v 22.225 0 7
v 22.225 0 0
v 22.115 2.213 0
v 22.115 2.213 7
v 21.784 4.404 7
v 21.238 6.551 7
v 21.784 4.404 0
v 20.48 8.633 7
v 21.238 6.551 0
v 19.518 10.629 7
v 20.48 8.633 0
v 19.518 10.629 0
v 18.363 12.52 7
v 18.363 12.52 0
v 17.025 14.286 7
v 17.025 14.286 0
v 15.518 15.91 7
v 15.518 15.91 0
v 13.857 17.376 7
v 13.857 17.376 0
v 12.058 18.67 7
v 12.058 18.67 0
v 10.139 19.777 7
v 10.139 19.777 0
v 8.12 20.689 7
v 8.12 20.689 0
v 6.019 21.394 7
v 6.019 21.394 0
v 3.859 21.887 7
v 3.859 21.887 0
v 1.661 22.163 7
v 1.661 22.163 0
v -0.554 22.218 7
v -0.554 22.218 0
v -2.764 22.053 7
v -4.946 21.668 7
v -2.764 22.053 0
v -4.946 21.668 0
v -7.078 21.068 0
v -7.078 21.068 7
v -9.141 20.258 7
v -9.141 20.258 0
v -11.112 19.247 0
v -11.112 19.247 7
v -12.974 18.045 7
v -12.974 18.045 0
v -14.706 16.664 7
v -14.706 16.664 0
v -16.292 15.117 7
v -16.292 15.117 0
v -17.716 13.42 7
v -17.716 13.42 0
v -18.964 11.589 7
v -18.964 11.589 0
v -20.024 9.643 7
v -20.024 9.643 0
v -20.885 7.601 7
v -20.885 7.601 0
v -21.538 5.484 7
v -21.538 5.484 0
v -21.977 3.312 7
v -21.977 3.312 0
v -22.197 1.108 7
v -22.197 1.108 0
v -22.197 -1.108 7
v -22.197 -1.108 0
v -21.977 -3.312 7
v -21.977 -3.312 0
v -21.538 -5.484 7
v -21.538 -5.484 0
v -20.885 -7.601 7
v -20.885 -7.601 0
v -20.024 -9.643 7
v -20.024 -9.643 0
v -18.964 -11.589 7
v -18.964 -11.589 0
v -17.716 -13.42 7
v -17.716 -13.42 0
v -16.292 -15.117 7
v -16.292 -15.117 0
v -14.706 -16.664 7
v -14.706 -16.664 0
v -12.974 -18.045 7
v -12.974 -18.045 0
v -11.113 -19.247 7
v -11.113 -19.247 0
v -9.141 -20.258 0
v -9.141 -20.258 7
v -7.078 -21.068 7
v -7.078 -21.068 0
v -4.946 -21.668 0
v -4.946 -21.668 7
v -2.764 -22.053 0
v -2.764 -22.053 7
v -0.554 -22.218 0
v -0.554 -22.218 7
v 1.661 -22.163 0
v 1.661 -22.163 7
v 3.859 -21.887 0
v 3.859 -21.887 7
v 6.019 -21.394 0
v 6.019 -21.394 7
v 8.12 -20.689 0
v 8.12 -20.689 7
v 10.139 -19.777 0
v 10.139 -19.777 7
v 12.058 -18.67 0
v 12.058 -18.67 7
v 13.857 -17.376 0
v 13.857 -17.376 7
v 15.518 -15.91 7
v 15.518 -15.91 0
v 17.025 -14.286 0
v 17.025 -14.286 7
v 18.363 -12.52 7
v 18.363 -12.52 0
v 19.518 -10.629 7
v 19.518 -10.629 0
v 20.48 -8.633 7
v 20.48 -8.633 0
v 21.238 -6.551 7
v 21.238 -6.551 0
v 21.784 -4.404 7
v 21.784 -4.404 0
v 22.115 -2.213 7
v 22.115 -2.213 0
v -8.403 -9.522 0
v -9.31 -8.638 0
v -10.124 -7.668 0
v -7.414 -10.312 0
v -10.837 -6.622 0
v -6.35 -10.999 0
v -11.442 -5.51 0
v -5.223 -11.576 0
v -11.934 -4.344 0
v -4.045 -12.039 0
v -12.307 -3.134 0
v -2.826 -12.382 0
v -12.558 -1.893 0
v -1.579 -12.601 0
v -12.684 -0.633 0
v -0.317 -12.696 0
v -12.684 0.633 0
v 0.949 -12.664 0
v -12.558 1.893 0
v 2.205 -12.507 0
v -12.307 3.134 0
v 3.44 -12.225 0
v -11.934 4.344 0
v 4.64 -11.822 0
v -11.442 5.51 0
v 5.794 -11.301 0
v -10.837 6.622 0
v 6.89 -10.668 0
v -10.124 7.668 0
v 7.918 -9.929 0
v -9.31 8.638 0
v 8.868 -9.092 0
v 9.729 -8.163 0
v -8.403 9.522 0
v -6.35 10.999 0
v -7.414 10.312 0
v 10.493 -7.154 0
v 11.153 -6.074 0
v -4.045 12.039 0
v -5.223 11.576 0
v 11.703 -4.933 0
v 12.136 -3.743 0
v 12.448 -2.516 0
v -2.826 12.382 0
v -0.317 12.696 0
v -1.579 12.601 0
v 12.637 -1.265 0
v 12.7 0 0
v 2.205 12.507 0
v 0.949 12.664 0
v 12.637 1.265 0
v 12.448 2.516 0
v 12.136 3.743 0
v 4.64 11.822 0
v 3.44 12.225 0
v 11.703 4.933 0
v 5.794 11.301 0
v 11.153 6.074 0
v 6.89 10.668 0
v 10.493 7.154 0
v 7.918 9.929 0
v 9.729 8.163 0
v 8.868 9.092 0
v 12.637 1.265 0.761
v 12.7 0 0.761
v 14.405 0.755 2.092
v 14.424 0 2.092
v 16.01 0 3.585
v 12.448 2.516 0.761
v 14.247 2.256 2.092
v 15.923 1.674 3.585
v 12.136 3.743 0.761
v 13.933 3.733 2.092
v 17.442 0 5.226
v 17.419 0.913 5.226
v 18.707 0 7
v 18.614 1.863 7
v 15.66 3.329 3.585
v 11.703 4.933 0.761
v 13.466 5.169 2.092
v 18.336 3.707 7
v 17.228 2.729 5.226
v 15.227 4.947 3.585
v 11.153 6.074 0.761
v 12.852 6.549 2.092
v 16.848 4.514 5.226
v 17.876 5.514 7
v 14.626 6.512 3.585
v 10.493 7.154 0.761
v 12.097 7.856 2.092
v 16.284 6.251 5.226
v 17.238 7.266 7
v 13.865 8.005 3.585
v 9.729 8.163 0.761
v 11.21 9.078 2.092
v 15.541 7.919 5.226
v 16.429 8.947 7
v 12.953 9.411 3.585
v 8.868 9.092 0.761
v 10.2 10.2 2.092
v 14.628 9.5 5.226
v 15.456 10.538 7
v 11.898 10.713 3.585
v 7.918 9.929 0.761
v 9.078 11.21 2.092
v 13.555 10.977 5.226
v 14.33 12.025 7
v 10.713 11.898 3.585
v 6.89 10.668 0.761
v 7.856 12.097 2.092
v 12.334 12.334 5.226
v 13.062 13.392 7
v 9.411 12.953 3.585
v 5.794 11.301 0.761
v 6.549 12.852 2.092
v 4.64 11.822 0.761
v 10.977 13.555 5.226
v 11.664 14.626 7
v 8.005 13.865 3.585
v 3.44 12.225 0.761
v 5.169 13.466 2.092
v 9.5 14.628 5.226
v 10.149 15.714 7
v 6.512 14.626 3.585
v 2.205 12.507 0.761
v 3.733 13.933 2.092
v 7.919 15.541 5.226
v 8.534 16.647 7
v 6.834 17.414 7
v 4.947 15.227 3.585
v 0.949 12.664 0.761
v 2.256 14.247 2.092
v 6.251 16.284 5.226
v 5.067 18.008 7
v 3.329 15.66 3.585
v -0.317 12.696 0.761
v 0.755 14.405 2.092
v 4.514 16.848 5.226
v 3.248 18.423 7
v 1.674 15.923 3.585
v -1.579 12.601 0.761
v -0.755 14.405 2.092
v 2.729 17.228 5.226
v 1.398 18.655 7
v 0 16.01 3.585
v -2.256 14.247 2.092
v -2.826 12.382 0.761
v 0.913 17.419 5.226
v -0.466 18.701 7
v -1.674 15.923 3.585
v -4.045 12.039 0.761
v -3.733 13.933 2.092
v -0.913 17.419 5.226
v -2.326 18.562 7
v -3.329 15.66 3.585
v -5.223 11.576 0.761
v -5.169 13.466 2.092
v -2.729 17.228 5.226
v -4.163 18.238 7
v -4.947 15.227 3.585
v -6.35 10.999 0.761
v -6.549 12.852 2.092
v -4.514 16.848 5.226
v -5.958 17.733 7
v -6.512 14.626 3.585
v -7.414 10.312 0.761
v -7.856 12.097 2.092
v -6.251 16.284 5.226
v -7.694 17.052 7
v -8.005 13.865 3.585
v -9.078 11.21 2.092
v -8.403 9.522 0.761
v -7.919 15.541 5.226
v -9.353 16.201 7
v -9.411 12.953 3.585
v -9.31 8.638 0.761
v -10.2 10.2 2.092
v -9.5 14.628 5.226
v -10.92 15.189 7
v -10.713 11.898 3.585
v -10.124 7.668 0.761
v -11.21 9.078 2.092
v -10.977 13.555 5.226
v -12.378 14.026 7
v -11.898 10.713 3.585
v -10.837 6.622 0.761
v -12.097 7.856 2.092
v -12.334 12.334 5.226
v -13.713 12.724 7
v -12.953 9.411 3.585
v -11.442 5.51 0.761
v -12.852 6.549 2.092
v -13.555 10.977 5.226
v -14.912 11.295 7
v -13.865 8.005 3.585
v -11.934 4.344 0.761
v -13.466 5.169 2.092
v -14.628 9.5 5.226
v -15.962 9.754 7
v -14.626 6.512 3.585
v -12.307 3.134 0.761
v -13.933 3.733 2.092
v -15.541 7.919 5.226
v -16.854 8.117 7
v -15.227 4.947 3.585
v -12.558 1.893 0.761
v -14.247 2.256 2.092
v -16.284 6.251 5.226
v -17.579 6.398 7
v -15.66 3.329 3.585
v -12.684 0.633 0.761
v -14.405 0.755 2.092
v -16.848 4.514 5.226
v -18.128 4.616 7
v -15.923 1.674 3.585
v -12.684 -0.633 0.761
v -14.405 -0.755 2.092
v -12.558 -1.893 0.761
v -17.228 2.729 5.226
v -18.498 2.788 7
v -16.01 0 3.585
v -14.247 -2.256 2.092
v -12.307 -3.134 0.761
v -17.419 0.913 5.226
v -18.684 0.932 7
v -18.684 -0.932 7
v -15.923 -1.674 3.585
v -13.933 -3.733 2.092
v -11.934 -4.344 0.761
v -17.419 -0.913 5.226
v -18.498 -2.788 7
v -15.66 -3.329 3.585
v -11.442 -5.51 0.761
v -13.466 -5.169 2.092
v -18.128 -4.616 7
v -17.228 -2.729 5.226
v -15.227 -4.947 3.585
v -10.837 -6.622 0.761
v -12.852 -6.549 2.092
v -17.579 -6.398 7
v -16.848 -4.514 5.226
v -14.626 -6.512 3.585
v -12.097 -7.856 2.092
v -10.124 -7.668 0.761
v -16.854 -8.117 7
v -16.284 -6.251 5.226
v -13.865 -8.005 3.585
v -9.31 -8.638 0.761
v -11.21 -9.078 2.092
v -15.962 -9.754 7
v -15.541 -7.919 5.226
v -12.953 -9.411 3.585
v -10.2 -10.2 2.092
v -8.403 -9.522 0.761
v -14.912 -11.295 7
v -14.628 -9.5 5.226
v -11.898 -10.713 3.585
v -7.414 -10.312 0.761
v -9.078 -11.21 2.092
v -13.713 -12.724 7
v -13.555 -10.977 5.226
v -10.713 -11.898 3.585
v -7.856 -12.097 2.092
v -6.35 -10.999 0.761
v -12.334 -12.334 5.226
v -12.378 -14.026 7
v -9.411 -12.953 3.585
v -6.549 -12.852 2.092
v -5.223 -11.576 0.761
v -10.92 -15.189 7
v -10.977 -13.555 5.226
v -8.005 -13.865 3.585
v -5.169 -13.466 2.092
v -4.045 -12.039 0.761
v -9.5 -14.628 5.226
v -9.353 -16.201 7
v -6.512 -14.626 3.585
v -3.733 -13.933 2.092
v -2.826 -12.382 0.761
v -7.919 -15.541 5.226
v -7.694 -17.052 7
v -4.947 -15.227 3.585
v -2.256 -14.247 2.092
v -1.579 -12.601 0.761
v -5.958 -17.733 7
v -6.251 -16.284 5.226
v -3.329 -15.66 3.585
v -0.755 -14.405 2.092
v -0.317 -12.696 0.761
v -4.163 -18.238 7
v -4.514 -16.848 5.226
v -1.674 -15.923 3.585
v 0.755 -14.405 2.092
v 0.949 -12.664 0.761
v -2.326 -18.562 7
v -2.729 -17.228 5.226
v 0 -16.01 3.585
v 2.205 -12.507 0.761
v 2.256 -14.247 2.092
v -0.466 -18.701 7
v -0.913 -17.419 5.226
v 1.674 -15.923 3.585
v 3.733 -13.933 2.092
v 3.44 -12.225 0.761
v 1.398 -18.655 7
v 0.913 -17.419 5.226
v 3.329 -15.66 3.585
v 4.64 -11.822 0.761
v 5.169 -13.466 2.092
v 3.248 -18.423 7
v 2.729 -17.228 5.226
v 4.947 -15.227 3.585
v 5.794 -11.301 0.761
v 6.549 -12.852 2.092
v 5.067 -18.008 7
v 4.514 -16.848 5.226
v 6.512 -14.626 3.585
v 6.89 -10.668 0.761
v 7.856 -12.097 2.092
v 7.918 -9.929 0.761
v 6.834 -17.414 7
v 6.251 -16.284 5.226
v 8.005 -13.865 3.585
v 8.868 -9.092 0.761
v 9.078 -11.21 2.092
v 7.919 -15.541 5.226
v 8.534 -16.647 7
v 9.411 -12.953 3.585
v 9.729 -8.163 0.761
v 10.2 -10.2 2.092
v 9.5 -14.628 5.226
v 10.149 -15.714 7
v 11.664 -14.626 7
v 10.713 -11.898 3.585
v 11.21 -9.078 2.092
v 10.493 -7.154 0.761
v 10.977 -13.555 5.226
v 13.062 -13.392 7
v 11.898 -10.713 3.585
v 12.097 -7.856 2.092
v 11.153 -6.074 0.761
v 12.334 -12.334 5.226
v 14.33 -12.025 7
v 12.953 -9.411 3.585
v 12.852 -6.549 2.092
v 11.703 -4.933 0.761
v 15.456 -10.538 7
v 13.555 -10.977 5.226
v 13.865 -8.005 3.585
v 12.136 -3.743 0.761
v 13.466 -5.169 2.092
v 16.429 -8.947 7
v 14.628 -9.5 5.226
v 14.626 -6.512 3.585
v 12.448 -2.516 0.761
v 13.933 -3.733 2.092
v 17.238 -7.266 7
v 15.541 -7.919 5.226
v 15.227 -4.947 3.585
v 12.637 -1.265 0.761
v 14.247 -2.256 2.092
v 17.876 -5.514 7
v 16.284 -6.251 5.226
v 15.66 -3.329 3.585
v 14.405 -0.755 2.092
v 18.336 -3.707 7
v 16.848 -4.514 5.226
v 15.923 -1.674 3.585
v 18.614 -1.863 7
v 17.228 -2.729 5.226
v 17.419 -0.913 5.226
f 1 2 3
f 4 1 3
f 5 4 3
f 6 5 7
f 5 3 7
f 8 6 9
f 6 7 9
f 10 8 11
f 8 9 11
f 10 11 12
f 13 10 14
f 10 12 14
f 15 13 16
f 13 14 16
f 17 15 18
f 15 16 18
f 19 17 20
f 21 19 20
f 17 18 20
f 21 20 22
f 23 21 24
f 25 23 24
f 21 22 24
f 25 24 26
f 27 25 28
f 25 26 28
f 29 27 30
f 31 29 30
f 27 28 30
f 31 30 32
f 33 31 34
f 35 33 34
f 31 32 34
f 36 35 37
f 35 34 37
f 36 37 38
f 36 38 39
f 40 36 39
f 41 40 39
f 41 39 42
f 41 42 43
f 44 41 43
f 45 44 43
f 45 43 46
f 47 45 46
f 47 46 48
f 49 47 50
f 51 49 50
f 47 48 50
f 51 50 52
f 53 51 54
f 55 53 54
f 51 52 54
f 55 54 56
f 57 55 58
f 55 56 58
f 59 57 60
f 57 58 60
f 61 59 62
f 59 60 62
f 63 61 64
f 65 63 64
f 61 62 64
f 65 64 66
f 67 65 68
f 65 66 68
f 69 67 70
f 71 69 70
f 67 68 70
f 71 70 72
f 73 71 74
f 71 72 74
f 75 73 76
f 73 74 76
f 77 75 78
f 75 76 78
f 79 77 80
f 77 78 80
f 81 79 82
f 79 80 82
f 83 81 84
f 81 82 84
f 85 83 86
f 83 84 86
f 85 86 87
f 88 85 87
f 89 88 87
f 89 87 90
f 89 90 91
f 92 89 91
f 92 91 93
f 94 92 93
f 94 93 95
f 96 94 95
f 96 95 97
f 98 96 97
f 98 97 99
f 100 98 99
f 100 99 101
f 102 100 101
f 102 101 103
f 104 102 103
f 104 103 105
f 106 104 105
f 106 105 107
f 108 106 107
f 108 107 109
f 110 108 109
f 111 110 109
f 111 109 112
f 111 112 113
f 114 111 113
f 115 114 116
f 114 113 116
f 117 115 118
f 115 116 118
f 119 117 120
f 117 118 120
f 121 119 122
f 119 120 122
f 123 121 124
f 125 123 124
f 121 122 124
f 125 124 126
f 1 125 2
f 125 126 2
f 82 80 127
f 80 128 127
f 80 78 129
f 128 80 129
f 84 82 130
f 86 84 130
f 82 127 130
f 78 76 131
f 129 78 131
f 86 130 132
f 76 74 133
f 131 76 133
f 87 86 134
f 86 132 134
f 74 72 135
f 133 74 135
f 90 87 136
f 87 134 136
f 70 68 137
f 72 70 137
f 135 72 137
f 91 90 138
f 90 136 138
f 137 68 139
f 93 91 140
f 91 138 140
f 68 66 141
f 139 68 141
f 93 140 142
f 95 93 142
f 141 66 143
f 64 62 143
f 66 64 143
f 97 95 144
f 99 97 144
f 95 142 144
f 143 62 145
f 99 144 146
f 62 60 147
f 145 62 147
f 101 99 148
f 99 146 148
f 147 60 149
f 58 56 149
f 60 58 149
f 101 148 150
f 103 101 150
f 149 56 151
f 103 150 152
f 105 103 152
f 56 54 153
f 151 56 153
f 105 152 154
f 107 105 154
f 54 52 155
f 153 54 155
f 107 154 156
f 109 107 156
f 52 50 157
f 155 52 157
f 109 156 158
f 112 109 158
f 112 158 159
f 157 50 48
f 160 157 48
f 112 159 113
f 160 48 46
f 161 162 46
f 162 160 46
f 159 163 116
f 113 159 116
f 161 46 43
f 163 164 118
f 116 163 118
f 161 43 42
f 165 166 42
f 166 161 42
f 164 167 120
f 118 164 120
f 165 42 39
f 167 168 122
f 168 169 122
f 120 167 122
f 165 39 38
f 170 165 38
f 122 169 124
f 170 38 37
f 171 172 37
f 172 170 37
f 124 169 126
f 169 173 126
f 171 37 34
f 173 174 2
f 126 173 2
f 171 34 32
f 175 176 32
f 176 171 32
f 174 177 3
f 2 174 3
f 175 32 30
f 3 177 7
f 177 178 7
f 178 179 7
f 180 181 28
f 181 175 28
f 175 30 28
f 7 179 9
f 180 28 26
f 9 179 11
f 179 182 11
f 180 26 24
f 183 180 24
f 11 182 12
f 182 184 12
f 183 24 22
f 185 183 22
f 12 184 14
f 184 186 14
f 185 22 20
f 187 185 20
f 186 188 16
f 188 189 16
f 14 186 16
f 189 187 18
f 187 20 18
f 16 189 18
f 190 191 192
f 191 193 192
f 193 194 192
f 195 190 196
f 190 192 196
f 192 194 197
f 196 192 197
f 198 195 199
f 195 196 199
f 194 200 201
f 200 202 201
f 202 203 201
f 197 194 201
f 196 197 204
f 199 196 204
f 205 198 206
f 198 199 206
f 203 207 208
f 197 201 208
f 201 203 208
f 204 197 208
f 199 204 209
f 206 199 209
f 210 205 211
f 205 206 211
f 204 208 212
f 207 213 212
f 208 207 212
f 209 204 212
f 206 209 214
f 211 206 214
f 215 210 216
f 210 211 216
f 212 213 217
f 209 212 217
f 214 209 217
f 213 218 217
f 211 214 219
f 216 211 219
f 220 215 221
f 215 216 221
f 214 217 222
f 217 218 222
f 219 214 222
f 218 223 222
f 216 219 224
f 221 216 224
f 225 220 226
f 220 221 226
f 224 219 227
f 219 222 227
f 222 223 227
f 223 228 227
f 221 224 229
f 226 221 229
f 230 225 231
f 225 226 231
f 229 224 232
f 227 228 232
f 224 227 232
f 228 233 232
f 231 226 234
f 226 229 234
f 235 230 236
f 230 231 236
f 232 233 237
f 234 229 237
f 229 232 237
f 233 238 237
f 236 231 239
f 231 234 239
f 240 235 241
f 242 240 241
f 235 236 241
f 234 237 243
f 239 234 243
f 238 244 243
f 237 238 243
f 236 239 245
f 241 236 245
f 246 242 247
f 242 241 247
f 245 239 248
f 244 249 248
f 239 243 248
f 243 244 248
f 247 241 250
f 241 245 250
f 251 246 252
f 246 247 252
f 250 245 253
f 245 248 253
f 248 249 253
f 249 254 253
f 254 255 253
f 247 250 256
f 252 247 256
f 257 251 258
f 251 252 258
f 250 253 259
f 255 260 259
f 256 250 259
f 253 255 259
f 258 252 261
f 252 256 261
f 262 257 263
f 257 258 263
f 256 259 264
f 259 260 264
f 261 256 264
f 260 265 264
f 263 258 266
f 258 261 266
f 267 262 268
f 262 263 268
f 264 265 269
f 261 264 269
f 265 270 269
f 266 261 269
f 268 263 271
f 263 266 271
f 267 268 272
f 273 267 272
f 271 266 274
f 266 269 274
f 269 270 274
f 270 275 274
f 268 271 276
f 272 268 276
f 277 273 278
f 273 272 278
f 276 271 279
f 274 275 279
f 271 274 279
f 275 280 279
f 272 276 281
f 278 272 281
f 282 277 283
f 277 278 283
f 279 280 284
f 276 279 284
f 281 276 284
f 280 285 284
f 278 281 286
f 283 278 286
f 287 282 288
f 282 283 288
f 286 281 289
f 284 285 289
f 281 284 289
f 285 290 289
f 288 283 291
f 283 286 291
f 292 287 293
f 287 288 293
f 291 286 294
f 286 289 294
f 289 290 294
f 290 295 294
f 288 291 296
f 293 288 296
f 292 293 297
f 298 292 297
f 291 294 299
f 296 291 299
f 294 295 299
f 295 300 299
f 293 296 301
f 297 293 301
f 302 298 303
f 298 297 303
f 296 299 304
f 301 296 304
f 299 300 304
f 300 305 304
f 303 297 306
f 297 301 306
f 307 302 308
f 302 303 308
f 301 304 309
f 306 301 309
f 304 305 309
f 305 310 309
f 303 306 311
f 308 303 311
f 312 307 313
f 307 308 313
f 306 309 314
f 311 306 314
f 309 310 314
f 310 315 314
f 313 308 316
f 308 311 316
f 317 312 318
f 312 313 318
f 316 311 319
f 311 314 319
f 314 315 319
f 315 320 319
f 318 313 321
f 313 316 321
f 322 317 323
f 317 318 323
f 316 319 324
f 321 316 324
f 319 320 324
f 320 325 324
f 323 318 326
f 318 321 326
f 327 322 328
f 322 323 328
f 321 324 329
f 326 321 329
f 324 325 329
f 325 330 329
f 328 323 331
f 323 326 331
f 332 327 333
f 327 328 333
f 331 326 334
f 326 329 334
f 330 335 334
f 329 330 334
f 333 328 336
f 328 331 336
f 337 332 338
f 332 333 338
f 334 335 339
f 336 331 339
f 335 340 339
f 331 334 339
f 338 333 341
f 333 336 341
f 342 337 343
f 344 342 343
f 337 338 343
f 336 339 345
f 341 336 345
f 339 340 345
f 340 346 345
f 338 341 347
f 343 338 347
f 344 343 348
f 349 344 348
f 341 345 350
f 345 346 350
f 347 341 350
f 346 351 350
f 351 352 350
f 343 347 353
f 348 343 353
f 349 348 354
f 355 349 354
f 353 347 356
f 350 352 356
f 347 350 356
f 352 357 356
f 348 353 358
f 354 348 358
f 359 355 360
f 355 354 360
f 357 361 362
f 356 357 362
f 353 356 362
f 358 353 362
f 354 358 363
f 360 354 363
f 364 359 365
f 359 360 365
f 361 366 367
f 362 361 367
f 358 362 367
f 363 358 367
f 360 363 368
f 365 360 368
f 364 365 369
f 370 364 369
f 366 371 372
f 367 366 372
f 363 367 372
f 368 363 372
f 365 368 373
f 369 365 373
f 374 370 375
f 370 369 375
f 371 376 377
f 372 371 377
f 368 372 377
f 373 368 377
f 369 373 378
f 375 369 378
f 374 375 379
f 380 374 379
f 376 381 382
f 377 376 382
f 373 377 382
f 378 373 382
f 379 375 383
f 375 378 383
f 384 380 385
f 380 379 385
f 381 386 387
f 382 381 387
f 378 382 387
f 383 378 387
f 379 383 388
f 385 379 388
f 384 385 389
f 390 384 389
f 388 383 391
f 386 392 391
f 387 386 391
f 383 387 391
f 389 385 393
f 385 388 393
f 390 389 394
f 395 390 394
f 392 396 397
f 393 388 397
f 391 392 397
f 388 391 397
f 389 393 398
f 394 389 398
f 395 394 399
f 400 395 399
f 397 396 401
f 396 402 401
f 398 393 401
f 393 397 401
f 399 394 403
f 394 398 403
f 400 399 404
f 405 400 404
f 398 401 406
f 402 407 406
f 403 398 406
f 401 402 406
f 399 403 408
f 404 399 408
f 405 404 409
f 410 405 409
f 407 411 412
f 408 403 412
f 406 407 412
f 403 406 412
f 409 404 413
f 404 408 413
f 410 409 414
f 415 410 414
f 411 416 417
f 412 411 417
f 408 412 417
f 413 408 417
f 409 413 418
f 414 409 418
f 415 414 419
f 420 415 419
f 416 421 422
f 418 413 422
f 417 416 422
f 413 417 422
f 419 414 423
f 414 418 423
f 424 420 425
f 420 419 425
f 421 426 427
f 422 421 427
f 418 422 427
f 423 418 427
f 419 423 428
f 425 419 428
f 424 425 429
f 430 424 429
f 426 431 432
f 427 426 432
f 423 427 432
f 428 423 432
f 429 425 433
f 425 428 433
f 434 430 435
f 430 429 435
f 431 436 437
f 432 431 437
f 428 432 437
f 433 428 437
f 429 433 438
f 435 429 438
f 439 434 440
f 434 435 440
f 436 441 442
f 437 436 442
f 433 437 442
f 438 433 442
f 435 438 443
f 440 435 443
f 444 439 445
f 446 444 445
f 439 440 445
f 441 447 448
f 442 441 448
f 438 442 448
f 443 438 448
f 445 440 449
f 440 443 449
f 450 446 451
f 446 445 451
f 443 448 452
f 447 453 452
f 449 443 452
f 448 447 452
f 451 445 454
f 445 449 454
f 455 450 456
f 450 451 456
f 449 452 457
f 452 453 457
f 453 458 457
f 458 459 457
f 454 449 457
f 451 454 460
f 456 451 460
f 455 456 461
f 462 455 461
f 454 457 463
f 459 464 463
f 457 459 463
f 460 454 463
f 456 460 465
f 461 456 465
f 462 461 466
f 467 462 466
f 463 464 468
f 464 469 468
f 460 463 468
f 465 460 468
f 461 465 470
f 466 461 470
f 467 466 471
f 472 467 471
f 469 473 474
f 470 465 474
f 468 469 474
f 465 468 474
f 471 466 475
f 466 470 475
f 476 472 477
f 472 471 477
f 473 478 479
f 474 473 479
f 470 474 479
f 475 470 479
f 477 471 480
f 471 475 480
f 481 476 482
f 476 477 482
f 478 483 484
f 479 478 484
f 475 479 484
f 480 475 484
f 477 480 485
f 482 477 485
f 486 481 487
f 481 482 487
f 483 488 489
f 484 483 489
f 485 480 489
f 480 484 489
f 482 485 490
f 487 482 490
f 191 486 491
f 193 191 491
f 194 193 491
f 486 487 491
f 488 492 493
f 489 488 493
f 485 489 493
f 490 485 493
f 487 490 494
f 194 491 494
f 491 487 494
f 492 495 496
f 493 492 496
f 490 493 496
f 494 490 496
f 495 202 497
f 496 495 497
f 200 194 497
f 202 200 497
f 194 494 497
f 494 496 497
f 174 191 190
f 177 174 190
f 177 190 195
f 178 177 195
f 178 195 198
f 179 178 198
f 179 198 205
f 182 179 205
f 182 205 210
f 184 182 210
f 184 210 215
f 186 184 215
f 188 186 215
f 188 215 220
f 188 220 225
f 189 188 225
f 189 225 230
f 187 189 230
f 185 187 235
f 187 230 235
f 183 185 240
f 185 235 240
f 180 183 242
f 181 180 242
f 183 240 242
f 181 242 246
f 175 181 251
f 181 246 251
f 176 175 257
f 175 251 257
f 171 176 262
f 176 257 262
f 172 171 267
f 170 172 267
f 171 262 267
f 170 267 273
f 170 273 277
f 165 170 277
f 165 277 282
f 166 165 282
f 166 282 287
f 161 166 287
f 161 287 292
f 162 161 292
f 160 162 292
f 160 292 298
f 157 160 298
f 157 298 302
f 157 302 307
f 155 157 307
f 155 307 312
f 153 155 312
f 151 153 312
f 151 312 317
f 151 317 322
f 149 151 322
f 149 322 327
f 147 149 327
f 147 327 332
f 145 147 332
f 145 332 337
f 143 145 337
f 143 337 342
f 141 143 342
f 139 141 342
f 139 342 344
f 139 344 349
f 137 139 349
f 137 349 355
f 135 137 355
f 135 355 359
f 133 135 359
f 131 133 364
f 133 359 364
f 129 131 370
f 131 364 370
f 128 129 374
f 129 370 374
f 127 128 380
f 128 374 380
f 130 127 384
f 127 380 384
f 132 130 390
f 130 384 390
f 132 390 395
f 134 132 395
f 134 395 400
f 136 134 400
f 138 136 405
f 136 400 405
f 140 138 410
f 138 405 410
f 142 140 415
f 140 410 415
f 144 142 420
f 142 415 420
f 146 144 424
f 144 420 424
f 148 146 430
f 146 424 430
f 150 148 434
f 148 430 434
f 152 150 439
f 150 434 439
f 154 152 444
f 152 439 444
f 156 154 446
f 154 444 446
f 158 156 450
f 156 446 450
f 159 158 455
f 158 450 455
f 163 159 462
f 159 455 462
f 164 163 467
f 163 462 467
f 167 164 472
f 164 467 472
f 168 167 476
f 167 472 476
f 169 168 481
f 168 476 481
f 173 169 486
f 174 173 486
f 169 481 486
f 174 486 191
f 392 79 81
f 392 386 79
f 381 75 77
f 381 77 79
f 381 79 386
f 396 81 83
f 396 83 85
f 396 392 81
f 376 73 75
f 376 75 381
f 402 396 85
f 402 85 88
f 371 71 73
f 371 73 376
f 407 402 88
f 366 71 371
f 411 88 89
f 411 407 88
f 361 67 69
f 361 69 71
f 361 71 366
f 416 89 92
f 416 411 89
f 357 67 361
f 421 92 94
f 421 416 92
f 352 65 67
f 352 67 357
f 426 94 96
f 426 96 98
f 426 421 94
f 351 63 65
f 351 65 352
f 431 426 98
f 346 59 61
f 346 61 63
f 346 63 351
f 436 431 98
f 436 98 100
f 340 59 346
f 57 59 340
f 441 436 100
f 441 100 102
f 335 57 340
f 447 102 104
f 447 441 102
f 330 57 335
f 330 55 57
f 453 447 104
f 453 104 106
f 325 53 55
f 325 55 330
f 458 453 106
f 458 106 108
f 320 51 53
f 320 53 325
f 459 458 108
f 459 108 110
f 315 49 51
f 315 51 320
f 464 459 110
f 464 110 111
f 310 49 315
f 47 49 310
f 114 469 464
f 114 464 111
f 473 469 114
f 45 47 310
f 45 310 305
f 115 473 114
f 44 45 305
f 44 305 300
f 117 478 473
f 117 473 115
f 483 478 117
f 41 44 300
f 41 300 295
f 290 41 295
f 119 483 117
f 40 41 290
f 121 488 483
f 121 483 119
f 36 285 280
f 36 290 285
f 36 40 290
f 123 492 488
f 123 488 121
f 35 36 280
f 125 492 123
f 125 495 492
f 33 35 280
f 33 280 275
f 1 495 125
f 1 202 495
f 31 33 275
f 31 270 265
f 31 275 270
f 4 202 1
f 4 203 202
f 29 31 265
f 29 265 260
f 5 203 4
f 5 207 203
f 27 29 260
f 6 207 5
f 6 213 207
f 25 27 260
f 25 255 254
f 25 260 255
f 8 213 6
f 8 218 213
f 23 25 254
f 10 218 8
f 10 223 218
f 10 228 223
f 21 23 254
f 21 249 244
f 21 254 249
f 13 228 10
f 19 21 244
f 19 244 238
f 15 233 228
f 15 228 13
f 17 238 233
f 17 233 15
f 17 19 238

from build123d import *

# Parameters (mm, degrees)
SKETCH2_R           = 22.225
BOSS_EXTRUDE1_DEPTH = 7
SKETCH3_R           = 12.7
CUT_EXTRUDE1_DEPTH  = 33.200951073


with BuildPart() as part:
    # Sketch2 → Boss-Extrude1 (new body)
    with BuildSketch(Plane.XY):
        Circle(SKETCH2_R)
    extrude(amount=BOSS_EXTRUDE1_DEPTH)

    # Sketch3 → Cut-Extrude1 (cut, through all)
    with BuildSketch(Plane.XY.offset(7)):
        Circle(SKETCH3_R)
    extrude(amount=-CUT_EXTRUDE1_DEPTH, mode=Mode.SUBTRACT)

    # Sketch4 → Cut-Revolve1 (revolve, cut)
    with BuildSketch(Plane(origin=(0, 0, 0), x_dir=(1, 0, 0), z_dir=(0, 1, 0)), mode=Mode.PRIVATE) as cut_revolve1_sk:
        with BuildLine():
            Line((-18.706967285, -7), (0, -7))
            Line((0, -7), (0, -0.761013597))
            Line((0, -0.761013597), (-12.7, -0.761013597))
            ThreePointArc((-12.7, -0.761013597), (-16.010329052, -3.585072538), (-18.706967285, -7))
        make_face()
    revolve(cut_revolve1_sk.sketch.rotate(Axis((0, 0, -16.764248705), (0, 0, 1)), 180), axis=Axis((0, 0, -16.764248705), (0, 0, 1)), mode=Mode.SUBTRACT)


solid = part.part
